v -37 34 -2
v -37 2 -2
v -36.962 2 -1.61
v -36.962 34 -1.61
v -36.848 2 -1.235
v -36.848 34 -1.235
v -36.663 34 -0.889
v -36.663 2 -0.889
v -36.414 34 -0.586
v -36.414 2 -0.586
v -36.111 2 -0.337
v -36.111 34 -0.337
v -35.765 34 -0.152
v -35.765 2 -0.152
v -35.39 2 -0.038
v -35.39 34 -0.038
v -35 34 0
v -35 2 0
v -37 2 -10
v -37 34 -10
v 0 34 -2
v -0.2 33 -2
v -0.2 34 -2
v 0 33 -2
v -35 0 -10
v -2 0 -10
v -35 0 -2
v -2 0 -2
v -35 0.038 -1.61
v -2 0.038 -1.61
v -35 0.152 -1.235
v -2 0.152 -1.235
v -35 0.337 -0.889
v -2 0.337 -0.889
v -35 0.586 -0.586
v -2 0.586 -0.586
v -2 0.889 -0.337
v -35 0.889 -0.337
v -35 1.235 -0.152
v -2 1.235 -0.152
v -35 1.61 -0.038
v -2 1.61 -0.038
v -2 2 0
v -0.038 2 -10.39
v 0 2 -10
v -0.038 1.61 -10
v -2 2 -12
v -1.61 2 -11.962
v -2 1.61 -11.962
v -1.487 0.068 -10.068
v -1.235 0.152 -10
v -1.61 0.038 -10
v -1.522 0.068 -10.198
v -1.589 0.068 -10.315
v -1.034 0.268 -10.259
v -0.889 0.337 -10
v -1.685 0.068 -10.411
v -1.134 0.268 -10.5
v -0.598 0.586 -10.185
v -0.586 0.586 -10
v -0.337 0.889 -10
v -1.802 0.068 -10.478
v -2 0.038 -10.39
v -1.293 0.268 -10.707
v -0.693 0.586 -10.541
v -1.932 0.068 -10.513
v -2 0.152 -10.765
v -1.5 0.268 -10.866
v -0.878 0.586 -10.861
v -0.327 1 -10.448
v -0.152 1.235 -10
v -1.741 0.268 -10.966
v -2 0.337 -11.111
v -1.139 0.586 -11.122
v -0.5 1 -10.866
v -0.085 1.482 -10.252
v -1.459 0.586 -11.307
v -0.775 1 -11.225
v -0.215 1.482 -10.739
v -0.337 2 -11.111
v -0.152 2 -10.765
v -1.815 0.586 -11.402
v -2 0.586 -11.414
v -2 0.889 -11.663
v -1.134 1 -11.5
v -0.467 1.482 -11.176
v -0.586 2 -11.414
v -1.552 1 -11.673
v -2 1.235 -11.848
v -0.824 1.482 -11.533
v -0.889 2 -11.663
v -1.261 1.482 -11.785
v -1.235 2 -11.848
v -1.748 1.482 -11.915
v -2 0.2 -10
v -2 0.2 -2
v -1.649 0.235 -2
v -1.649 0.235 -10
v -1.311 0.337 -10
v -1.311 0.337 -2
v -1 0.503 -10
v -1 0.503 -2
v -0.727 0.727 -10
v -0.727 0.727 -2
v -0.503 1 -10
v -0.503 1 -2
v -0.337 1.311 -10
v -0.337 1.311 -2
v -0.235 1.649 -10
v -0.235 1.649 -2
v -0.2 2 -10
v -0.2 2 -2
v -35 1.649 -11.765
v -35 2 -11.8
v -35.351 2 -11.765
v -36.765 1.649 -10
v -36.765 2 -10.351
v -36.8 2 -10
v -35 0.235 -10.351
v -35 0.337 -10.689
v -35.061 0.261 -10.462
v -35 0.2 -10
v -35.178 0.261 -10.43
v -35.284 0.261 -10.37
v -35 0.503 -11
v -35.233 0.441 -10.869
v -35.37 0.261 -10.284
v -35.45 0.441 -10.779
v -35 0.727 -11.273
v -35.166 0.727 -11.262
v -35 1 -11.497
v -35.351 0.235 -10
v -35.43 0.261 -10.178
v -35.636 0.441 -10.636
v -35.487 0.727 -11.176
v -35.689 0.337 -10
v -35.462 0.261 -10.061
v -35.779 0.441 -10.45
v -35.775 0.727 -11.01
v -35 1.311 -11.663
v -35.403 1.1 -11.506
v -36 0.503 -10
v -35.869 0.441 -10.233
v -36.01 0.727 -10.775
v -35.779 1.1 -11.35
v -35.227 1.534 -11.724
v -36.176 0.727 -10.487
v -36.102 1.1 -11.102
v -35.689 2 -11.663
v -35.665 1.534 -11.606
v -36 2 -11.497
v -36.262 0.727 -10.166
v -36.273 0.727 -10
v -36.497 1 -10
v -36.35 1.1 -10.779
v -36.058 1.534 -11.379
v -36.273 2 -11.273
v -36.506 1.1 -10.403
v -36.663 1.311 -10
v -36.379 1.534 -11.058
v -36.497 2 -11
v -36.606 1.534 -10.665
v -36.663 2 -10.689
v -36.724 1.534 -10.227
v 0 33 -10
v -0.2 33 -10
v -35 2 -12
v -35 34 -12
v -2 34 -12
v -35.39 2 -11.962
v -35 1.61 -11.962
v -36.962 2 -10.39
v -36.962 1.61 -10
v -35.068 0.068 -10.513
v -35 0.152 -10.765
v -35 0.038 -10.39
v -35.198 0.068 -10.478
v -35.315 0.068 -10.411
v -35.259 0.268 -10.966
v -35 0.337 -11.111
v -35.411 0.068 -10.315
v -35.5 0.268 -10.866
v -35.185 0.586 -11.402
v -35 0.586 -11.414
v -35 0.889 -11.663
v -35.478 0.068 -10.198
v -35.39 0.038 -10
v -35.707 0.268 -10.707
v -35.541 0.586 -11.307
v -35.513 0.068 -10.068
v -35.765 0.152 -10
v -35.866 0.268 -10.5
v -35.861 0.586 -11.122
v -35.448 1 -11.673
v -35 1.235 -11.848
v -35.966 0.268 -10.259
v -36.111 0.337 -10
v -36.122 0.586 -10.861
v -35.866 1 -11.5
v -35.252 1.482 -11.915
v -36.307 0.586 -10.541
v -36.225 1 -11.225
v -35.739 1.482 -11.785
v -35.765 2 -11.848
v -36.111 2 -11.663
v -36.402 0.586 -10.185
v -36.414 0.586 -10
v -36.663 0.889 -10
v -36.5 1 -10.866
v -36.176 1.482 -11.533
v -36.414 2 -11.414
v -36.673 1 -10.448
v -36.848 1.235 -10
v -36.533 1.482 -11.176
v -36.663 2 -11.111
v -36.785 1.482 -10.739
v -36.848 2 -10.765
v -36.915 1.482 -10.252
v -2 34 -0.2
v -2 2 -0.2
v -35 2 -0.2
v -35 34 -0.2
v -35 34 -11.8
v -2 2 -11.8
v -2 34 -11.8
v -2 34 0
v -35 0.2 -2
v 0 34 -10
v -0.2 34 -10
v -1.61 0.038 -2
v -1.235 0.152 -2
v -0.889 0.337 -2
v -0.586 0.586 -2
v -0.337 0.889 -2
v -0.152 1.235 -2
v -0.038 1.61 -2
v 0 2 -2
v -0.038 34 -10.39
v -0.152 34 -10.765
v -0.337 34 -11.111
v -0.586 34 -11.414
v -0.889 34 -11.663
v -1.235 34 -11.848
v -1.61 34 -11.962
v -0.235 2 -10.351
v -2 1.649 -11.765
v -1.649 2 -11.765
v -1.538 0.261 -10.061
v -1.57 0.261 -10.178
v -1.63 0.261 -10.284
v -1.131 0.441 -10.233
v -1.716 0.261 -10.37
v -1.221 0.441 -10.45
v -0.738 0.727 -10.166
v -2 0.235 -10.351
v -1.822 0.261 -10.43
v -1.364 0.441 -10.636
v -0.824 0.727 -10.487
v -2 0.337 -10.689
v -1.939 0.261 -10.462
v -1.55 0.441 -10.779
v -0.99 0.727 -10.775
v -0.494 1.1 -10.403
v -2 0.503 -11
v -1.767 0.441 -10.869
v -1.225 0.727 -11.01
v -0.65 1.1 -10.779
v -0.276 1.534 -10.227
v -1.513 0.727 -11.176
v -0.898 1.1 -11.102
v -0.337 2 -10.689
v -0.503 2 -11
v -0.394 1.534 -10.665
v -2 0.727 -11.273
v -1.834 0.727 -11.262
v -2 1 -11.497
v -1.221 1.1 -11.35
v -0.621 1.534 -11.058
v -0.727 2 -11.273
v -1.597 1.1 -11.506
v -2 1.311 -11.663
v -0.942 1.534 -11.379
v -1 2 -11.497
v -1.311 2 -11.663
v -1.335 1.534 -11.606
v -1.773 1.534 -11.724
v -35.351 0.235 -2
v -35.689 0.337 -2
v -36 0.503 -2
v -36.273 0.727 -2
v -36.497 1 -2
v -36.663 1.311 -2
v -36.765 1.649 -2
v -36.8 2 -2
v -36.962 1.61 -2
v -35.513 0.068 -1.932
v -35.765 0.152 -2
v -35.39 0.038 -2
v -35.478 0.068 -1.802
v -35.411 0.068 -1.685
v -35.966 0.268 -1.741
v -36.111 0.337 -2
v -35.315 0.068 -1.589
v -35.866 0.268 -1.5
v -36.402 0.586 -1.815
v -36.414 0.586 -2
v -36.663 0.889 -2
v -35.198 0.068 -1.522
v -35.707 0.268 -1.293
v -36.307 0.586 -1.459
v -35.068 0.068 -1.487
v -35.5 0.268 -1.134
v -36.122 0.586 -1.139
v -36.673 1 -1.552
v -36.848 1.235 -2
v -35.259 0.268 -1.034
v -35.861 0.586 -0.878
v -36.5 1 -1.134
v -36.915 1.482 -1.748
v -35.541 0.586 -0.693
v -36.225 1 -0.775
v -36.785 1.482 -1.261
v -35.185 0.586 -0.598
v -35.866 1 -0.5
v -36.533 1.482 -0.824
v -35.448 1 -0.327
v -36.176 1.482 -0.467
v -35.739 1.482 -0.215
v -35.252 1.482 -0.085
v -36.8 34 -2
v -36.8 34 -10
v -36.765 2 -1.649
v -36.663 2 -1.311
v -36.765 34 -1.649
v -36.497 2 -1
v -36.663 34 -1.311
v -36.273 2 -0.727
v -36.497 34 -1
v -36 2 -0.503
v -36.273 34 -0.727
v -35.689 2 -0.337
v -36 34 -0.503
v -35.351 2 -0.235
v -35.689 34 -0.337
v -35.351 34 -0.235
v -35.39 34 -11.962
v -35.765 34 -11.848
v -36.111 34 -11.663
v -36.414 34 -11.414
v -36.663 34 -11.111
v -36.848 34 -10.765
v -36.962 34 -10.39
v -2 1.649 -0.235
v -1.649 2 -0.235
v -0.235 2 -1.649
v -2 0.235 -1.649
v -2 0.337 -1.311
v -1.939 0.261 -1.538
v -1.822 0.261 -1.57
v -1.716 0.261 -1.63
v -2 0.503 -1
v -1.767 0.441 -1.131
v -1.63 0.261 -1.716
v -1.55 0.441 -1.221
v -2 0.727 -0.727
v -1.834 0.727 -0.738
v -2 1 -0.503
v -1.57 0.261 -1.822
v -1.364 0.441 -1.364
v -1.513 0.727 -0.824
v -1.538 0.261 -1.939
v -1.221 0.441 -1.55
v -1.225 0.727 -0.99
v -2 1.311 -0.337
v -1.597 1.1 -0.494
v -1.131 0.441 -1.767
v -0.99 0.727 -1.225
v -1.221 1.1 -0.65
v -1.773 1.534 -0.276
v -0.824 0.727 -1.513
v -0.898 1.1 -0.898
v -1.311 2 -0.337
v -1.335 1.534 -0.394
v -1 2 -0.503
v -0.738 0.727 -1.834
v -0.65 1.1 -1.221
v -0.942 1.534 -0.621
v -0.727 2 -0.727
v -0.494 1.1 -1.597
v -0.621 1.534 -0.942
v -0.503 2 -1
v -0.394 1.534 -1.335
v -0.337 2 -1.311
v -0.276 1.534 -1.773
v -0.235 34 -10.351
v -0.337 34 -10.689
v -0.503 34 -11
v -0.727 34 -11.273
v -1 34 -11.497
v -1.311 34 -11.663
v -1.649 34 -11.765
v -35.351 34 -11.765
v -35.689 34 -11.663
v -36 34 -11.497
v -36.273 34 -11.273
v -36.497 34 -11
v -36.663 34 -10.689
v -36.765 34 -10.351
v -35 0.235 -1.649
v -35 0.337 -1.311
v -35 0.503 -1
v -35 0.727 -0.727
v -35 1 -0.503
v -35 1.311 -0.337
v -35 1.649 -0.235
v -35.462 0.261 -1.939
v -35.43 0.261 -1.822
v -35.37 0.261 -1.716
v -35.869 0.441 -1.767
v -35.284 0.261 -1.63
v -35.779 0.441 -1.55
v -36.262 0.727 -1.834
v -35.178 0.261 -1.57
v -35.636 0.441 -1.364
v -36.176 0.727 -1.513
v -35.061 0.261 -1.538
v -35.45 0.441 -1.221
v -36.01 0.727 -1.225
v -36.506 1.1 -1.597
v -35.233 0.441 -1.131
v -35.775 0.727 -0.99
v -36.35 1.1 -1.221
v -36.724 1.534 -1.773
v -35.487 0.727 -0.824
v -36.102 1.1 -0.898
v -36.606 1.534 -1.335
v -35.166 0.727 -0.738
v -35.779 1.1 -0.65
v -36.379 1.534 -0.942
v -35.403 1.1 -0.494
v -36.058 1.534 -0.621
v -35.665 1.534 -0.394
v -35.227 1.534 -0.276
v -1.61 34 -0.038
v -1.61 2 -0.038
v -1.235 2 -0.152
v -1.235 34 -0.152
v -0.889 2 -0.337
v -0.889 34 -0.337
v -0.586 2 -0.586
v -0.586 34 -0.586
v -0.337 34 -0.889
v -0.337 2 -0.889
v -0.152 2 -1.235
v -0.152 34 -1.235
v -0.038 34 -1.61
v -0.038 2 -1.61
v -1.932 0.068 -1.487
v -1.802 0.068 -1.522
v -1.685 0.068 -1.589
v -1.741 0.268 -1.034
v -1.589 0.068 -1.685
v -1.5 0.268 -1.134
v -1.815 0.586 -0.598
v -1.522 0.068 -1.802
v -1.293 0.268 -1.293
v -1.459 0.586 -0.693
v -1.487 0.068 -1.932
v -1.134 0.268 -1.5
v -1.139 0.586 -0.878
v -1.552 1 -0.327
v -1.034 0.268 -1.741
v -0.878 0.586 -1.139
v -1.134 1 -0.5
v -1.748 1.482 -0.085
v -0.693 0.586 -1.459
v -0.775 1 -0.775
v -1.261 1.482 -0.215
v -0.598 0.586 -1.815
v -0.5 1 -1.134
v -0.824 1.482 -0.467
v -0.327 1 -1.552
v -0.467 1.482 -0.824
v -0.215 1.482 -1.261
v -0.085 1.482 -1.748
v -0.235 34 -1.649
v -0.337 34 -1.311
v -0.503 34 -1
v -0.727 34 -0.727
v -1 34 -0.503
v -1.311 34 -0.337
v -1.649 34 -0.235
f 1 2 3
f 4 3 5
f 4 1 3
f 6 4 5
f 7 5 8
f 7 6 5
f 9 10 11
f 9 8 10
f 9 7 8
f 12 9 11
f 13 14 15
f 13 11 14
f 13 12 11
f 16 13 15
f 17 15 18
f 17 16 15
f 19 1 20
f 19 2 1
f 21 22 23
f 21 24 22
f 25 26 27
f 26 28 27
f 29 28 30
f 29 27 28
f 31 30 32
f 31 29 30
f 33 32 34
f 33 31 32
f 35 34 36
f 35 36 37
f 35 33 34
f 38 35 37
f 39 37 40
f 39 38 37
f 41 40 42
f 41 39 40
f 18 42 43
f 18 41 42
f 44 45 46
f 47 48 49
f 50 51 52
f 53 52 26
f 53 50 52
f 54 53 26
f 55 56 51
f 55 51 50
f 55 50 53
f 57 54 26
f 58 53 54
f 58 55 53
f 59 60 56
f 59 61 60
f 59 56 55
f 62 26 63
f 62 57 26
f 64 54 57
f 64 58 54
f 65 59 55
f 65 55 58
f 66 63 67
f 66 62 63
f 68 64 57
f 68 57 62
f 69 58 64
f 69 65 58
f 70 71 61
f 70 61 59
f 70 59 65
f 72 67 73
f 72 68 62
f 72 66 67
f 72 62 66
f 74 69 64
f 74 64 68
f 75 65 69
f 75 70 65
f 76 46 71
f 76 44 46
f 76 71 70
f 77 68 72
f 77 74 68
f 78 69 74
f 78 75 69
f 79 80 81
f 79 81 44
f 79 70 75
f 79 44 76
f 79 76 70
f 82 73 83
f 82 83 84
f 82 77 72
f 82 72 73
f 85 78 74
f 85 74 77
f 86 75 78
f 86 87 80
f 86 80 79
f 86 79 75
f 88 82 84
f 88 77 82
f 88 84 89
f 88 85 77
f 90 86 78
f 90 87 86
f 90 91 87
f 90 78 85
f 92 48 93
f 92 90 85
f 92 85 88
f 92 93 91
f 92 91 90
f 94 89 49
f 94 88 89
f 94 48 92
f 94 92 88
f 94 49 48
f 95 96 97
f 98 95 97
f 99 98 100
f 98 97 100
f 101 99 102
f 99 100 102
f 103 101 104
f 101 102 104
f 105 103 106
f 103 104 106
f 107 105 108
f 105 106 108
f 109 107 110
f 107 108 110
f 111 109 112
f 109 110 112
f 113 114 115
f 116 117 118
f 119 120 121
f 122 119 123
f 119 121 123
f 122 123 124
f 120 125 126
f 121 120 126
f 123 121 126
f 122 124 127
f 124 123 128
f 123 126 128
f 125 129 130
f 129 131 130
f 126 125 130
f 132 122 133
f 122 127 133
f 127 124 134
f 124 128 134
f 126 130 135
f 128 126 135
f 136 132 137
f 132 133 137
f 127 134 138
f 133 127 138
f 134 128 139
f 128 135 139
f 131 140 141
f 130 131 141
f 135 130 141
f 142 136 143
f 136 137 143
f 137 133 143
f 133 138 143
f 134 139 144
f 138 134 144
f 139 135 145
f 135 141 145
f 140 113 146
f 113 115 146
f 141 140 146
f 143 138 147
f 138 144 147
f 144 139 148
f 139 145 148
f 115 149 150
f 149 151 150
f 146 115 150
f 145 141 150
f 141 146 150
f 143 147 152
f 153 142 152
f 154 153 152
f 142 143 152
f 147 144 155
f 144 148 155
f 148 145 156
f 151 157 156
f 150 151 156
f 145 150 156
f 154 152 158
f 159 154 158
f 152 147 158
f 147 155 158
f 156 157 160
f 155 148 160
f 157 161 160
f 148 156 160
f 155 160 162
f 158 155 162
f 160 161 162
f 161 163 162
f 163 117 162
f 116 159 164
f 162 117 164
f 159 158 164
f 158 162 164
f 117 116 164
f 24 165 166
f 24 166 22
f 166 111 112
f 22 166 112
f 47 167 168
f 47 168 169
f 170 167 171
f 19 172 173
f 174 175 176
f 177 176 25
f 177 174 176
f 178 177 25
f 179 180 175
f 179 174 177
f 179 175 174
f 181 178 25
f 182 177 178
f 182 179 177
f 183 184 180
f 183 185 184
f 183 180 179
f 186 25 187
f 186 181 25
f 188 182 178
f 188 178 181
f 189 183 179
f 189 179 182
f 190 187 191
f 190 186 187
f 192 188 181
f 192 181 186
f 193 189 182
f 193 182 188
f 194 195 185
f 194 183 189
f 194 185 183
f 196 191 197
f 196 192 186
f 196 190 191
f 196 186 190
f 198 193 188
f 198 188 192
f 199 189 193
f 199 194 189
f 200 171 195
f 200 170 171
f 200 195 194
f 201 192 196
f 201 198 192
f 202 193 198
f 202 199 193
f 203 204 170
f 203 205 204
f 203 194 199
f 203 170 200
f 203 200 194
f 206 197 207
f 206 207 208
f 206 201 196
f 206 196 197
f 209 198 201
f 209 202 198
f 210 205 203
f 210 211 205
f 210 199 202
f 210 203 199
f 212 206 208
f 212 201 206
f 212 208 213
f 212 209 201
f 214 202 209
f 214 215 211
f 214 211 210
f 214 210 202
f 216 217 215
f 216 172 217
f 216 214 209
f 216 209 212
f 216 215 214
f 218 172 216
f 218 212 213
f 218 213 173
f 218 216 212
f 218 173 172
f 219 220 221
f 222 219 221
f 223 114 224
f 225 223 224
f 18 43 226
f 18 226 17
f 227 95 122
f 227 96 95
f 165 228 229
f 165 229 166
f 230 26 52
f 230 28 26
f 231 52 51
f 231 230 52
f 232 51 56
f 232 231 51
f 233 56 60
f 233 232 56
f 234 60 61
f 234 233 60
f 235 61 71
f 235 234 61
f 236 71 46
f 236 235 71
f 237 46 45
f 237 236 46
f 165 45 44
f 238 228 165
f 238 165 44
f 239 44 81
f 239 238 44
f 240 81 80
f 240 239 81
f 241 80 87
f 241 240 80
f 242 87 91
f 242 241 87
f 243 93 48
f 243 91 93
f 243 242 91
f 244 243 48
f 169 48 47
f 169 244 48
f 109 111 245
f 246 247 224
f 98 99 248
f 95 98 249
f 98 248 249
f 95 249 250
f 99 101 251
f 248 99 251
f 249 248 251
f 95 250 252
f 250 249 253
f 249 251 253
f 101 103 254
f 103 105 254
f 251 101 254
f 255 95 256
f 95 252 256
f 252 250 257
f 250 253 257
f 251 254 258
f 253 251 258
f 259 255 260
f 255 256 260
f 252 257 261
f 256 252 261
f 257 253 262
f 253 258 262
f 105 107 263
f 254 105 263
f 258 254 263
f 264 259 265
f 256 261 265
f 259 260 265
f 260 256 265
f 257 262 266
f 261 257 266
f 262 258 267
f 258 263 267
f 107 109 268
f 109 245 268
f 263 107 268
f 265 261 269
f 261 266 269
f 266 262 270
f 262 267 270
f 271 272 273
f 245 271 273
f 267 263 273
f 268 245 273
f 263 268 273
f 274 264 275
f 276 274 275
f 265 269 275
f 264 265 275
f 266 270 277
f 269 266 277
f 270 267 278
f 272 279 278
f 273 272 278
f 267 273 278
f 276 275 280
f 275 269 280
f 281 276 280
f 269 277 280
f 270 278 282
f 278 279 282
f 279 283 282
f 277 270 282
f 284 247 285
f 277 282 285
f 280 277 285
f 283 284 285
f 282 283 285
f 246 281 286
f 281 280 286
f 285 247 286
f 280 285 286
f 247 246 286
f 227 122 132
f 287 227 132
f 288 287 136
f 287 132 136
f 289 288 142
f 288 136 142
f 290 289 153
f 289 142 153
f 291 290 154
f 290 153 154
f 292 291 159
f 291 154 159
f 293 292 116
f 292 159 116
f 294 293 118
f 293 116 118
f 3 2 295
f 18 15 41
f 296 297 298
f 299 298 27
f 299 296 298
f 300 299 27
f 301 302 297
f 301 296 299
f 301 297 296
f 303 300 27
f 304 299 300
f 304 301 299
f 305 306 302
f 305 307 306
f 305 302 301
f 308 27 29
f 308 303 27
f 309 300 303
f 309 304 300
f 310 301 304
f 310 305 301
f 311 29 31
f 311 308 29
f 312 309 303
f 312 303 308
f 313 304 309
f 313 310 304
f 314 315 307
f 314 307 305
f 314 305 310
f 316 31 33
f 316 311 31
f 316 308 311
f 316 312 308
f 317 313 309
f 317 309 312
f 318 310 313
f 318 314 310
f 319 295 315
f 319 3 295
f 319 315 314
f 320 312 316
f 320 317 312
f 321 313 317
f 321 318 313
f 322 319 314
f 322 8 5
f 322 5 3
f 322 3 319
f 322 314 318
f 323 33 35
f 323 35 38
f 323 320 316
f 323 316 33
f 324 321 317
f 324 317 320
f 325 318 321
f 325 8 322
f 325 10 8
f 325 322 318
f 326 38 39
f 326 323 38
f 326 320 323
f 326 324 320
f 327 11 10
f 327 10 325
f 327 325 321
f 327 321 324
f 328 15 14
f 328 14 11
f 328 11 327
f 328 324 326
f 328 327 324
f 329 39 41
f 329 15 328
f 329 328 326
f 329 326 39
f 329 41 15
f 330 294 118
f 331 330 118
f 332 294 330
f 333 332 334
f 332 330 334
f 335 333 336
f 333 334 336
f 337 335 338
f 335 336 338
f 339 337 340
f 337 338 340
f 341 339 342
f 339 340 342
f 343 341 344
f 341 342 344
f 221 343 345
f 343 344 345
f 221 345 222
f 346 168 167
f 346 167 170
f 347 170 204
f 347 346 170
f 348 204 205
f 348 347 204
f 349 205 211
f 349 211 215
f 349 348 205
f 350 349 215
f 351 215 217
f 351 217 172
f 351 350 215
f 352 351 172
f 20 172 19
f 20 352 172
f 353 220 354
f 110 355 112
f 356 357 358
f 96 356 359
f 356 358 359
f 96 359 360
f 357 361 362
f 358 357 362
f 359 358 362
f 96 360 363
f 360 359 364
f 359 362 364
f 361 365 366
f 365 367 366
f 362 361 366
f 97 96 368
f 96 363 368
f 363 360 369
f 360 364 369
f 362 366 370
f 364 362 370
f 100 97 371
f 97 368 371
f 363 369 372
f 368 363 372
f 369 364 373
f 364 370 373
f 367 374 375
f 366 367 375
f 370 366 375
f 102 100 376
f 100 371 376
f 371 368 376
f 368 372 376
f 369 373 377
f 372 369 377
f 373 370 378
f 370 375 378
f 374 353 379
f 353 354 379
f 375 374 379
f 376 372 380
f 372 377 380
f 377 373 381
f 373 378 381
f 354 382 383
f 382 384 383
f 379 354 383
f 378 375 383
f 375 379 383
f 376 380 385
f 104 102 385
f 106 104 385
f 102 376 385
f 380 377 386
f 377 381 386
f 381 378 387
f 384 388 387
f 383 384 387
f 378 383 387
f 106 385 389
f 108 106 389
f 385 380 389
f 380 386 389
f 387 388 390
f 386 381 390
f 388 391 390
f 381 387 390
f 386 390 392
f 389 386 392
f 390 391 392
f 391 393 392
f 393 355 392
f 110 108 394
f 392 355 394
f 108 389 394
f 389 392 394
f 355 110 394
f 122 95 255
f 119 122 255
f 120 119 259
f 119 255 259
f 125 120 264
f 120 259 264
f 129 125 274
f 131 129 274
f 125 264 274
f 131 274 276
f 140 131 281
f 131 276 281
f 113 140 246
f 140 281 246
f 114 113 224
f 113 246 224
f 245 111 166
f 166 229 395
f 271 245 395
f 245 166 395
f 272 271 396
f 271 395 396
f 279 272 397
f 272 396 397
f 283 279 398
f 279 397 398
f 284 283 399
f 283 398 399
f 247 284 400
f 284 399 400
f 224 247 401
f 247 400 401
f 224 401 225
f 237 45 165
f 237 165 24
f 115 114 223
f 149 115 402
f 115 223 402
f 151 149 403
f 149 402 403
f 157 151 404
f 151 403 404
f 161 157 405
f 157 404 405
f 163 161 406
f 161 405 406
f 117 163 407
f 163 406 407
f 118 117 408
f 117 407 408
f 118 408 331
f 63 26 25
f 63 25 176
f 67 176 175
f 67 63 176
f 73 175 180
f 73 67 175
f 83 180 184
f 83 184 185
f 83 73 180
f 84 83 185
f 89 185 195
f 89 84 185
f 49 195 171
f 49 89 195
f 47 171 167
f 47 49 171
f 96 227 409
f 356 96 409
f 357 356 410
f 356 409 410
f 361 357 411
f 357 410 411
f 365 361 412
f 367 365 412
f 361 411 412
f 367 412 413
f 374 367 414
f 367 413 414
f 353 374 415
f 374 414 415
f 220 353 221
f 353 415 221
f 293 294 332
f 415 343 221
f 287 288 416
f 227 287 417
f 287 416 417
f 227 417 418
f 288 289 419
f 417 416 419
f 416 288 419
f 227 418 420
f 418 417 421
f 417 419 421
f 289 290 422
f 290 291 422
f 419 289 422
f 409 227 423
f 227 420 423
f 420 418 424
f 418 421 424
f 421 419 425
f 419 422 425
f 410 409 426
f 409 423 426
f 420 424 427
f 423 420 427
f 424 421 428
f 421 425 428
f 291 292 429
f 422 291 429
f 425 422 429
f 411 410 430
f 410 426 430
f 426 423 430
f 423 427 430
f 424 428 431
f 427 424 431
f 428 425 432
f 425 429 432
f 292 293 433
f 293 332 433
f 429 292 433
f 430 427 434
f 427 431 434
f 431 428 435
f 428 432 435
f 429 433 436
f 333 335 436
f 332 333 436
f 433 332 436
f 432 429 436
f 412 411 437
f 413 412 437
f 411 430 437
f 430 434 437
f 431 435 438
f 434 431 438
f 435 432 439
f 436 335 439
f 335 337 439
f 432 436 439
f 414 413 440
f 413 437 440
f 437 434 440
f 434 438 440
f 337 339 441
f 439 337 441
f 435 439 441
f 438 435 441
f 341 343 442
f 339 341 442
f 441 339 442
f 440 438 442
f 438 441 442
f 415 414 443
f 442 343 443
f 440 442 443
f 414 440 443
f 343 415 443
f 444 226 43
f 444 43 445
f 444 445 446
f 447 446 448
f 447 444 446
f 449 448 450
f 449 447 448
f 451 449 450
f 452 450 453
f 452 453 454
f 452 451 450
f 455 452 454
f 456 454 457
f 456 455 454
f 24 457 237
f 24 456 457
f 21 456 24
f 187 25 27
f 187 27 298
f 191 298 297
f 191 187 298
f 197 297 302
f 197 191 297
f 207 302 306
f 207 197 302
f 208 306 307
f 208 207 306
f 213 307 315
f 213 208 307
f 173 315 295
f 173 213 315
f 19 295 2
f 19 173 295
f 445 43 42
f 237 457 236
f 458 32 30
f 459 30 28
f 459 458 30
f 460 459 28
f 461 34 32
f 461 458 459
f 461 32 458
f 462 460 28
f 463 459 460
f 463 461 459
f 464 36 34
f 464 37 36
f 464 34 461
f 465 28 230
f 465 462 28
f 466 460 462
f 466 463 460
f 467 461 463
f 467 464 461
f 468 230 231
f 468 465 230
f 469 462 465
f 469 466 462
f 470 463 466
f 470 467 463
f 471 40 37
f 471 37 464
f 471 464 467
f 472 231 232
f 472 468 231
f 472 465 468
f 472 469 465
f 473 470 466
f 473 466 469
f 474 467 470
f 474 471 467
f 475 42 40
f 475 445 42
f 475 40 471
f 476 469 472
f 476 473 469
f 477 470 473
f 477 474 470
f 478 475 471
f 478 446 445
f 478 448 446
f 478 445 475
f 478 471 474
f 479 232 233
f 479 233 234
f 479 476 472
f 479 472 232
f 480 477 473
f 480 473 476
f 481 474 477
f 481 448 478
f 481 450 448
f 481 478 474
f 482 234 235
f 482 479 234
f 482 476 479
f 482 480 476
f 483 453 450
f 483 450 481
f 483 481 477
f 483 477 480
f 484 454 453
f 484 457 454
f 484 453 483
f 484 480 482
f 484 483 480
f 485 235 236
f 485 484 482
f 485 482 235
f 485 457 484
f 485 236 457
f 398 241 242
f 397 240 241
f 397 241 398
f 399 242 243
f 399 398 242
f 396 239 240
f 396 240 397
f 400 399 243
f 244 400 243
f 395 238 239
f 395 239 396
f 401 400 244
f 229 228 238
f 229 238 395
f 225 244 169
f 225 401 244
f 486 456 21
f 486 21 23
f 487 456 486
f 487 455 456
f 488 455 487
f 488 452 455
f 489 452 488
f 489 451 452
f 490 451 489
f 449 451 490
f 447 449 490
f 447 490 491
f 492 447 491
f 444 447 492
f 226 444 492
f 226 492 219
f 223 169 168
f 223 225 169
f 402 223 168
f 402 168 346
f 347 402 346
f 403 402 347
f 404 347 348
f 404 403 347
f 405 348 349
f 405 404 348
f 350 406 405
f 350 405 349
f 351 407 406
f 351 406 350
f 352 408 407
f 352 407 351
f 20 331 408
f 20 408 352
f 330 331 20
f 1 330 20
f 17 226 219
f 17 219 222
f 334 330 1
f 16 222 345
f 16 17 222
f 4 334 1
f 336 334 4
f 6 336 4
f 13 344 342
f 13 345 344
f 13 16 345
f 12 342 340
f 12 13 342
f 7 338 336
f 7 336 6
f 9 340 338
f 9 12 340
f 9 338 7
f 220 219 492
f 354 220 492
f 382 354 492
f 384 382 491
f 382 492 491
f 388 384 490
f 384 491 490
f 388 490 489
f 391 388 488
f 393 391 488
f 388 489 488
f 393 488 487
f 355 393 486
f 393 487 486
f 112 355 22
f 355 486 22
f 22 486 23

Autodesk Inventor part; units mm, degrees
ref_plane "YZ Plane" through (0, 0, 0) normal (1, 0, 0) x (0, 1, 0)
ref_plane "XZ Plane" through (0, 0, 0) normal (0, 1, 0) x (-1, 0, 0)
ref_plane "XY Plane" through (0, 0, 0) normal (0, 0, 1) x (1, 0, 0)
sketch "Sketch1" plane through (0, 0, 0) normal (0, 1, 0) x (-1, 0, 0)
  line L0 (0, 0) -> (37, 0)
  line L1 (37, 0) -> (37, -12)
  line L2 (37, -12) -> (0, -12)
  line L3 (0, -12) -> (0, 0)
  dimension "d0" = 12
  dimension "d1" = 37
extrude "Extrusion1" add sketch "Sketch1" along normal blind 34
fillet "Fillet1" radius 2 8 edges at (0, 17, 0) (0, 17, -12) (-37, 17, 0) (-37, 17, -12) (-18.5, 0, 0) (-18.5, 0, -12) (0, 0, -6) (-37, 0, -6)
shell "Shell1" thickness 0.2 removed faces 1 at (-24, 34, -4)
sketch "Sketch2" plane through (0, 2, -10) normal (1, 0, 0) x (0, 0, -1)
  line L0 (0, 32) -> (-8, 32) projected
  line L1 (0, 32) -> (0, 0) projected
  line L2 (-8, 32) -> (0, 32)
  line L3 (0, 32) -> (0, 31)
  line L4 (0, 31) -> (-8, 31)
  line L5 (-8, 31) -> (-8, 32)
  point P0 (-10, -2)
  dimension "d6" = 1
extrude "Extrusion2" cut sketch "Sketch2" against normal blind 10
properties part number "Down_Case"
